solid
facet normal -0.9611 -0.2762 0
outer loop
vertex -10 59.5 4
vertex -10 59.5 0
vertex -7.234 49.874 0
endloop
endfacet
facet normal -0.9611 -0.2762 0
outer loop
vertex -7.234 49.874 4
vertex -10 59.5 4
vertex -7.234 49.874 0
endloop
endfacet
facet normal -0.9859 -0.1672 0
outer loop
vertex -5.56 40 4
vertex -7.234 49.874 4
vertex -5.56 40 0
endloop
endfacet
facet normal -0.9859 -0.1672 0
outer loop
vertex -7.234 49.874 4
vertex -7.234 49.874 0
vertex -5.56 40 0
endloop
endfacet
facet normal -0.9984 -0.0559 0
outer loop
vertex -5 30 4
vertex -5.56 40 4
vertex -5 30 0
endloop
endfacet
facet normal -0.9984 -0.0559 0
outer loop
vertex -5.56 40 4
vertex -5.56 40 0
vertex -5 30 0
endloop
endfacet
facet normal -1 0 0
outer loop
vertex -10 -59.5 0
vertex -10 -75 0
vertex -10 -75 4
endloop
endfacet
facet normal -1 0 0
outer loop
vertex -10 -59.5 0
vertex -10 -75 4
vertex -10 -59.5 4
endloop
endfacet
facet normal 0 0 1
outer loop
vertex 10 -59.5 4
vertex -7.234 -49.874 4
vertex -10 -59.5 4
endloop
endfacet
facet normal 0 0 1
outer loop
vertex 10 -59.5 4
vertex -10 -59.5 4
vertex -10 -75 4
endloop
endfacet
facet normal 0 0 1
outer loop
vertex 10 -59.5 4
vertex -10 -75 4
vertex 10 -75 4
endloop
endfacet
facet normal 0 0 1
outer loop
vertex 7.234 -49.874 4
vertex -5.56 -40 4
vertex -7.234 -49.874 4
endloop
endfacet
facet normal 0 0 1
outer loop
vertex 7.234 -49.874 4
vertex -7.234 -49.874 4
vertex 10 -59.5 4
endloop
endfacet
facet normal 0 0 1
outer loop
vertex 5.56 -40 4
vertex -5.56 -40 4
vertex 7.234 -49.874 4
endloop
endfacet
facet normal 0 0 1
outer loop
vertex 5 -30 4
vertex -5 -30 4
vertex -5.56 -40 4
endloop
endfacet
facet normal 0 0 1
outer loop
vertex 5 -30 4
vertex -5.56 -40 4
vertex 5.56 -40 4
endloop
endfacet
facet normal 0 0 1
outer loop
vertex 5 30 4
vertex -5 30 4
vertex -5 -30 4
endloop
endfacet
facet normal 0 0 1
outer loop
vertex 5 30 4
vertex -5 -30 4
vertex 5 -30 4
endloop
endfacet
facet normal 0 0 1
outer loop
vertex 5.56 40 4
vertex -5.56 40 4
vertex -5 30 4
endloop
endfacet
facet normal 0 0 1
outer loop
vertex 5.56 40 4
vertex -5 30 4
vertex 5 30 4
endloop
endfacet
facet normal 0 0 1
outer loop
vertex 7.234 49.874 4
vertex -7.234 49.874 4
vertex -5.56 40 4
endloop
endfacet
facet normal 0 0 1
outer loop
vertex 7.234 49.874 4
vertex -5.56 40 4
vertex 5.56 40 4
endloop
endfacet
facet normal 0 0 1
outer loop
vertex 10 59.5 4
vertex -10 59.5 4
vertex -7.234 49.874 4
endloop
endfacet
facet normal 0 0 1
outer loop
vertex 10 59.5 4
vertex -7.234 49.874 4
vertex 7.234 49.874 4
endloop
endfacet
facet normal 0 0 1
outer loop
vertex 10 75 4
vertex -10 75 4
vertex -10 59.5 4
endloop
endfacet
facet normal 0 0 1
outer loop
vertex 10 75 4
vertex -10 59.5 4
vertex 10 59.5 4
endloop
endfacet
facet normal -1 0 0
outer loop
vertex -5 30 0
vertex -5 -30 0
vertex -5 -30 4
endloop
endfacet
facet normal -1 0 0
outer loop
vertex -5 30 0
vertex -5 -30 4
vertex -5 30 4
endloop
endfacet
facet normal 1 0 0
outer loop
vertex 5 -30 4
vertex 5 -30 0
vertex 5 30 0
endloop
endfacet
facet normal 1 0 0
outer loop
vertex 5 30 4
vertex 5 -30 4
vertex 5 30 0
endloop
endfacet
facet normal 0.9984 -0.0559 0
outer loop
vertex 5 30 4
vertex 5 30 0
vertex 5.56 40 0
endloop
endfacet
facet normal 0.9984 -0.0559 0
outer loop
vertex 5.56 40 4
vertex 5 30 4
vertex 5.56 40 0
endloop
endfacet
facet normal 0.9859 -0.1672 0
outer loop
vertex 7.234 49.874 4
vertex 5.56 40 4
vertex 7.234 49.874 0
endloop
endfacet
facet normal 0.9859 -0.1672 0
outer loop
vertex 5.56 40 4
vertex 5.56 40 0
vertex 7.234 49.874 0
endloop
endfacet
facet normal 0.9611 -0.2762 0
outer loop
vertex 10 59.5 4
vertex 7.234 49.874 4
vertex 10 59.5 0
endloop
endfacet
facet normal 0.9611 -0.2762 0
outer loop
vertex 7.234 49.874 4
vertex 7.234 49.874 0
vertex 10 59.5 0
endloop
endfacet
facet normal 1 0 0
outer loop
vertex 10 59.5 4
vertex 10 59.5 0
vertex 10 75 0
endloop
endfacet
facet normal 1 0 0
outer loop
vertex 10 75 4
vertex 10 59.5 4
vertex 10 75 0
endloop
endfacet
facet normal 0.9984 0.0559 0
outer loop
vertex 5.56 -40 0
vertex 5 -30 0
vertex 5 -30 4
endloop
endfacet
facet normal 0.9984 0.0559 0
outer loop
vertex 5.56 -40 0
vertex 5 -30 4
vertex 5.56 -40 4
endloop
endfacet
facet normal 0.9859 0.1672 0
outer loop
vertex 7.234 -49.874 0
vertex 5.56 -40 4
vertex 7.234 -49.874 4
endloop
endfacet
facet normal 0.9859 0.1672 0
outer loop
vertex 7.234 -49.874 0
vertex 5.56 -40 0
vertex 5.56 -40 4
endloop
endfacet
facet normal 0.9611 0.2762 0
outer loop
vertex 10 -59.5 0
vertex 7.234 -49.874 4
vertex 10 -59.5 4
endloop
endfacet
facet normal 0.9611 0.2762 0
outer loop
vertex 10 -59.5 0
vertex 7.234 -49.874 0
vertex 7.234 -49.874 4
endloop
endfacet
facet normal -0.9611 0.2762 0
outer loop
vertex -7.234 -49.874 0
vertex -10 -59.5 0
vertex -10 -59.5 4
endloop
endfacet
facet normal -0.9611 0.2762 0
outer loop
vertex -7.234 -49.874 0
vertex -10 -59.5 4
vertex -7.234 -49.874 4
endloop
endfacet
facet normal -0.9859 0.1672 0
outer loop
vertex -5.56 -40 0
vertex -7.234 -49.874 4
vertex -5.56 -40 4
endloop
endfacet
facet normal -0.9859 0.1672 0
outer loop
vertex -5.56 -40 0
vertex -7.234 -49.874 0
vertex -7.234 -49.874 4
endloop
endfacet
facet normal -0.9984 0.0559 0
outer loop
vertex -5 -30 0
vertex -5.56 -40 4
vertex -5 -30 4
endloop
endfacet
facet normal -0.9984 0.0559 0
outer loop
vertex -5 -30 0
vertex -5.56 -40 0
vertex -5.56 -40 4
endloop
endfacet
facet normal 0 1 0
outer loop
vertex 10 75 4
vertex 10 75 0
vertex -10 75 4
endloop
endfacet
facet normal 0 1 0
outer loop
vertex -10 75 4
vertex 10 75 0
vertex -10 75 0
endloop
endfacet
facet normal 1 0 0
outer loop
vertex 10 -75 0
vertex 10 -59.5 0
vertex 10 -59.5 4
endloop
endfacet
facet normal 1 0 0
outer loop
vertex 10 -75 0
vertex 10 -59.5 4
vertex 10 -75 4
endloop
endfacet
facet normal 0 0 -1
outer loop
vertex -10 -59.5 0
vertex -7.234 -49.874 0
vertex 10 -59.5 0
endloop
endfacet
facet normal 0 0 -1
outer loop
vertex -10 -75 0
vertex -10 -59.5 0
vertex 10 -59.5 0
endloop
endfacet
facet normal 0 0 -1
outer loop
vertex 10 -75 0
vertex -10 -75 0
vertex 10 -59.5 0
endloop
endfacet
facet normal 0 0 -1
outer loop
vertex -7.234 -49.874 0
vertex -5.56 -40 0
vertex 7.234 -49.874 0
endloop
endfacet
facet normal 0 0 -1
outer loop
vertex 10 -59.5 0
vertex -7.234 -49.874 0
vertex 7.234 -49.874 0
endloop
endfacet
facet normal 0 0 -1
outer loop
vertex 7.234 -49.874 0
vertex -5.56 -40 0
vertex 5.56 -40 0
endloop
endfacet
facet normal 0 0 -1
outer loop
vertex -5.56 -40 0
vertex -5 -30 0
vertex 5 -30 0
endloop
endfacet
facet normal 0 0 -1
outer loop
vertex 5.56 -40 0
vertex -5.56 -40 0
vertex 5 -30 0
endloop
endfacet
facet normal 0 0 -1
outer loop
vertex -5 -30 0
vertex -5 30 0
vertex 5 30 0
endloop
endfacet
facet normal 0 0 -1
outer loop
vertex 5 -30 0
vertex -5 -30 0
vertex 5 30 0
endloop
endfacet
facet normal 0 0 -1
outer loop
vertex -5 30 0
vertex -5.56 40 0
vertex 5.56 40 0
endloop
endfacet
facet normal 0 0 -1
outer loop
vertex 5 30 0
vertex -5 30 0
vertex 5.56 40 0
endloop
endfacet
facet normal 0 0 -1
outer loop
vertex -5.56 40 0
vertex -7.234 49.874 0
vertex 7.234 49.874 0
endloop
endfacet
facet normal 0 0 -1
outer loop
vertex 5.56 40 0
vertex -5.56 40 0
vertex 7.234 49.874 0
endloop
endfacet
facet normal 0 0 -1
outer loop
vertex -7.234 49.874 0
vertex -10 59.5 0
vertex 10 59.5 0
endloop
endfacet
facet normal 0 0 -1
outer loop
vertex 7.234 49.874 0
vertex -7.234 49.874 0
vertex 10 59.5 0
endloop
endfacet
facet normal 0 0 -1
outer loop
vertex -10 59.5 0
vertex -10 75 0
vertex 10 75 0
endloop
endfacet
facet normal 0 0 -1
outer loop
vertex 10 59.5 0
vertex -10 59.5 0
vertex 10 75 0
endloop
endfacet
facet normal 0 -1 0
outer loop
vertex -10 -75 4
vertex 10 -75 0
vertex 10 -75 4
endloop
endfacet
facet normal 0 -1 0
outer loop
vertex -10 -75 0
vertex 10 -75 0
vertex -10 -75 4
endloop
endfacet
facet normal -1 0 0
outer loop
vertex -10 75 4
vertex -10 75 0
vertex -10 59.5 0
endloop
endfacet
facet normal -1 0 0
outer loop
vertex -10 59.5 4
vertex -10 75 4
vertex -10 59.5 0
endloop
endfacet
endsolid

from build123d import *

# Parameters (mm, degrees)
ESQUISSE1_W        = 10
ESQUISSE1_H        = 60
BOSS_EXTRU_1_DEPTH = 4


with BuildPart() as part:
    # Esquisse1 → Boss.-Extru.1 (new body)
    with BuildSketch(Plane.XY):
        with BuildLine():
            Line((-5, 30), (5, 30))
            ThreePointArc((5, 30), (6.258850628, 44.9603643), (10, 59.5))
            Line((10, 59.5), (10, 75))
            Line((10, 75), (-10, 75))
            Line((-10, 75), (-10, 59.5))
            ThreePointArc((-10, 59.5), (-6.258850628, 44.9603643), (-5, 30))
        make_face()
        Rectangle(ESQUISSE1_W, ESQUISSE1_H)
        with BuildLine():
            Line((10, -59.5), (10, -75))
            Line((10, -75), (-10, -75))
            Line((-10, -75), (-10, -59.5))
            ThreePointArc((-10, -59.5), (-6.258850628, -44.9603643), (-5, -30))
            Line((-5, -30), (5, -30))
            ThreePointArc((5, -30), (6.258850628, -44.9603643), (10, -59.5))
        make_face()
    extrude(amount=BOSS_EXTRU_1_DEPTH)


solid = part.part
